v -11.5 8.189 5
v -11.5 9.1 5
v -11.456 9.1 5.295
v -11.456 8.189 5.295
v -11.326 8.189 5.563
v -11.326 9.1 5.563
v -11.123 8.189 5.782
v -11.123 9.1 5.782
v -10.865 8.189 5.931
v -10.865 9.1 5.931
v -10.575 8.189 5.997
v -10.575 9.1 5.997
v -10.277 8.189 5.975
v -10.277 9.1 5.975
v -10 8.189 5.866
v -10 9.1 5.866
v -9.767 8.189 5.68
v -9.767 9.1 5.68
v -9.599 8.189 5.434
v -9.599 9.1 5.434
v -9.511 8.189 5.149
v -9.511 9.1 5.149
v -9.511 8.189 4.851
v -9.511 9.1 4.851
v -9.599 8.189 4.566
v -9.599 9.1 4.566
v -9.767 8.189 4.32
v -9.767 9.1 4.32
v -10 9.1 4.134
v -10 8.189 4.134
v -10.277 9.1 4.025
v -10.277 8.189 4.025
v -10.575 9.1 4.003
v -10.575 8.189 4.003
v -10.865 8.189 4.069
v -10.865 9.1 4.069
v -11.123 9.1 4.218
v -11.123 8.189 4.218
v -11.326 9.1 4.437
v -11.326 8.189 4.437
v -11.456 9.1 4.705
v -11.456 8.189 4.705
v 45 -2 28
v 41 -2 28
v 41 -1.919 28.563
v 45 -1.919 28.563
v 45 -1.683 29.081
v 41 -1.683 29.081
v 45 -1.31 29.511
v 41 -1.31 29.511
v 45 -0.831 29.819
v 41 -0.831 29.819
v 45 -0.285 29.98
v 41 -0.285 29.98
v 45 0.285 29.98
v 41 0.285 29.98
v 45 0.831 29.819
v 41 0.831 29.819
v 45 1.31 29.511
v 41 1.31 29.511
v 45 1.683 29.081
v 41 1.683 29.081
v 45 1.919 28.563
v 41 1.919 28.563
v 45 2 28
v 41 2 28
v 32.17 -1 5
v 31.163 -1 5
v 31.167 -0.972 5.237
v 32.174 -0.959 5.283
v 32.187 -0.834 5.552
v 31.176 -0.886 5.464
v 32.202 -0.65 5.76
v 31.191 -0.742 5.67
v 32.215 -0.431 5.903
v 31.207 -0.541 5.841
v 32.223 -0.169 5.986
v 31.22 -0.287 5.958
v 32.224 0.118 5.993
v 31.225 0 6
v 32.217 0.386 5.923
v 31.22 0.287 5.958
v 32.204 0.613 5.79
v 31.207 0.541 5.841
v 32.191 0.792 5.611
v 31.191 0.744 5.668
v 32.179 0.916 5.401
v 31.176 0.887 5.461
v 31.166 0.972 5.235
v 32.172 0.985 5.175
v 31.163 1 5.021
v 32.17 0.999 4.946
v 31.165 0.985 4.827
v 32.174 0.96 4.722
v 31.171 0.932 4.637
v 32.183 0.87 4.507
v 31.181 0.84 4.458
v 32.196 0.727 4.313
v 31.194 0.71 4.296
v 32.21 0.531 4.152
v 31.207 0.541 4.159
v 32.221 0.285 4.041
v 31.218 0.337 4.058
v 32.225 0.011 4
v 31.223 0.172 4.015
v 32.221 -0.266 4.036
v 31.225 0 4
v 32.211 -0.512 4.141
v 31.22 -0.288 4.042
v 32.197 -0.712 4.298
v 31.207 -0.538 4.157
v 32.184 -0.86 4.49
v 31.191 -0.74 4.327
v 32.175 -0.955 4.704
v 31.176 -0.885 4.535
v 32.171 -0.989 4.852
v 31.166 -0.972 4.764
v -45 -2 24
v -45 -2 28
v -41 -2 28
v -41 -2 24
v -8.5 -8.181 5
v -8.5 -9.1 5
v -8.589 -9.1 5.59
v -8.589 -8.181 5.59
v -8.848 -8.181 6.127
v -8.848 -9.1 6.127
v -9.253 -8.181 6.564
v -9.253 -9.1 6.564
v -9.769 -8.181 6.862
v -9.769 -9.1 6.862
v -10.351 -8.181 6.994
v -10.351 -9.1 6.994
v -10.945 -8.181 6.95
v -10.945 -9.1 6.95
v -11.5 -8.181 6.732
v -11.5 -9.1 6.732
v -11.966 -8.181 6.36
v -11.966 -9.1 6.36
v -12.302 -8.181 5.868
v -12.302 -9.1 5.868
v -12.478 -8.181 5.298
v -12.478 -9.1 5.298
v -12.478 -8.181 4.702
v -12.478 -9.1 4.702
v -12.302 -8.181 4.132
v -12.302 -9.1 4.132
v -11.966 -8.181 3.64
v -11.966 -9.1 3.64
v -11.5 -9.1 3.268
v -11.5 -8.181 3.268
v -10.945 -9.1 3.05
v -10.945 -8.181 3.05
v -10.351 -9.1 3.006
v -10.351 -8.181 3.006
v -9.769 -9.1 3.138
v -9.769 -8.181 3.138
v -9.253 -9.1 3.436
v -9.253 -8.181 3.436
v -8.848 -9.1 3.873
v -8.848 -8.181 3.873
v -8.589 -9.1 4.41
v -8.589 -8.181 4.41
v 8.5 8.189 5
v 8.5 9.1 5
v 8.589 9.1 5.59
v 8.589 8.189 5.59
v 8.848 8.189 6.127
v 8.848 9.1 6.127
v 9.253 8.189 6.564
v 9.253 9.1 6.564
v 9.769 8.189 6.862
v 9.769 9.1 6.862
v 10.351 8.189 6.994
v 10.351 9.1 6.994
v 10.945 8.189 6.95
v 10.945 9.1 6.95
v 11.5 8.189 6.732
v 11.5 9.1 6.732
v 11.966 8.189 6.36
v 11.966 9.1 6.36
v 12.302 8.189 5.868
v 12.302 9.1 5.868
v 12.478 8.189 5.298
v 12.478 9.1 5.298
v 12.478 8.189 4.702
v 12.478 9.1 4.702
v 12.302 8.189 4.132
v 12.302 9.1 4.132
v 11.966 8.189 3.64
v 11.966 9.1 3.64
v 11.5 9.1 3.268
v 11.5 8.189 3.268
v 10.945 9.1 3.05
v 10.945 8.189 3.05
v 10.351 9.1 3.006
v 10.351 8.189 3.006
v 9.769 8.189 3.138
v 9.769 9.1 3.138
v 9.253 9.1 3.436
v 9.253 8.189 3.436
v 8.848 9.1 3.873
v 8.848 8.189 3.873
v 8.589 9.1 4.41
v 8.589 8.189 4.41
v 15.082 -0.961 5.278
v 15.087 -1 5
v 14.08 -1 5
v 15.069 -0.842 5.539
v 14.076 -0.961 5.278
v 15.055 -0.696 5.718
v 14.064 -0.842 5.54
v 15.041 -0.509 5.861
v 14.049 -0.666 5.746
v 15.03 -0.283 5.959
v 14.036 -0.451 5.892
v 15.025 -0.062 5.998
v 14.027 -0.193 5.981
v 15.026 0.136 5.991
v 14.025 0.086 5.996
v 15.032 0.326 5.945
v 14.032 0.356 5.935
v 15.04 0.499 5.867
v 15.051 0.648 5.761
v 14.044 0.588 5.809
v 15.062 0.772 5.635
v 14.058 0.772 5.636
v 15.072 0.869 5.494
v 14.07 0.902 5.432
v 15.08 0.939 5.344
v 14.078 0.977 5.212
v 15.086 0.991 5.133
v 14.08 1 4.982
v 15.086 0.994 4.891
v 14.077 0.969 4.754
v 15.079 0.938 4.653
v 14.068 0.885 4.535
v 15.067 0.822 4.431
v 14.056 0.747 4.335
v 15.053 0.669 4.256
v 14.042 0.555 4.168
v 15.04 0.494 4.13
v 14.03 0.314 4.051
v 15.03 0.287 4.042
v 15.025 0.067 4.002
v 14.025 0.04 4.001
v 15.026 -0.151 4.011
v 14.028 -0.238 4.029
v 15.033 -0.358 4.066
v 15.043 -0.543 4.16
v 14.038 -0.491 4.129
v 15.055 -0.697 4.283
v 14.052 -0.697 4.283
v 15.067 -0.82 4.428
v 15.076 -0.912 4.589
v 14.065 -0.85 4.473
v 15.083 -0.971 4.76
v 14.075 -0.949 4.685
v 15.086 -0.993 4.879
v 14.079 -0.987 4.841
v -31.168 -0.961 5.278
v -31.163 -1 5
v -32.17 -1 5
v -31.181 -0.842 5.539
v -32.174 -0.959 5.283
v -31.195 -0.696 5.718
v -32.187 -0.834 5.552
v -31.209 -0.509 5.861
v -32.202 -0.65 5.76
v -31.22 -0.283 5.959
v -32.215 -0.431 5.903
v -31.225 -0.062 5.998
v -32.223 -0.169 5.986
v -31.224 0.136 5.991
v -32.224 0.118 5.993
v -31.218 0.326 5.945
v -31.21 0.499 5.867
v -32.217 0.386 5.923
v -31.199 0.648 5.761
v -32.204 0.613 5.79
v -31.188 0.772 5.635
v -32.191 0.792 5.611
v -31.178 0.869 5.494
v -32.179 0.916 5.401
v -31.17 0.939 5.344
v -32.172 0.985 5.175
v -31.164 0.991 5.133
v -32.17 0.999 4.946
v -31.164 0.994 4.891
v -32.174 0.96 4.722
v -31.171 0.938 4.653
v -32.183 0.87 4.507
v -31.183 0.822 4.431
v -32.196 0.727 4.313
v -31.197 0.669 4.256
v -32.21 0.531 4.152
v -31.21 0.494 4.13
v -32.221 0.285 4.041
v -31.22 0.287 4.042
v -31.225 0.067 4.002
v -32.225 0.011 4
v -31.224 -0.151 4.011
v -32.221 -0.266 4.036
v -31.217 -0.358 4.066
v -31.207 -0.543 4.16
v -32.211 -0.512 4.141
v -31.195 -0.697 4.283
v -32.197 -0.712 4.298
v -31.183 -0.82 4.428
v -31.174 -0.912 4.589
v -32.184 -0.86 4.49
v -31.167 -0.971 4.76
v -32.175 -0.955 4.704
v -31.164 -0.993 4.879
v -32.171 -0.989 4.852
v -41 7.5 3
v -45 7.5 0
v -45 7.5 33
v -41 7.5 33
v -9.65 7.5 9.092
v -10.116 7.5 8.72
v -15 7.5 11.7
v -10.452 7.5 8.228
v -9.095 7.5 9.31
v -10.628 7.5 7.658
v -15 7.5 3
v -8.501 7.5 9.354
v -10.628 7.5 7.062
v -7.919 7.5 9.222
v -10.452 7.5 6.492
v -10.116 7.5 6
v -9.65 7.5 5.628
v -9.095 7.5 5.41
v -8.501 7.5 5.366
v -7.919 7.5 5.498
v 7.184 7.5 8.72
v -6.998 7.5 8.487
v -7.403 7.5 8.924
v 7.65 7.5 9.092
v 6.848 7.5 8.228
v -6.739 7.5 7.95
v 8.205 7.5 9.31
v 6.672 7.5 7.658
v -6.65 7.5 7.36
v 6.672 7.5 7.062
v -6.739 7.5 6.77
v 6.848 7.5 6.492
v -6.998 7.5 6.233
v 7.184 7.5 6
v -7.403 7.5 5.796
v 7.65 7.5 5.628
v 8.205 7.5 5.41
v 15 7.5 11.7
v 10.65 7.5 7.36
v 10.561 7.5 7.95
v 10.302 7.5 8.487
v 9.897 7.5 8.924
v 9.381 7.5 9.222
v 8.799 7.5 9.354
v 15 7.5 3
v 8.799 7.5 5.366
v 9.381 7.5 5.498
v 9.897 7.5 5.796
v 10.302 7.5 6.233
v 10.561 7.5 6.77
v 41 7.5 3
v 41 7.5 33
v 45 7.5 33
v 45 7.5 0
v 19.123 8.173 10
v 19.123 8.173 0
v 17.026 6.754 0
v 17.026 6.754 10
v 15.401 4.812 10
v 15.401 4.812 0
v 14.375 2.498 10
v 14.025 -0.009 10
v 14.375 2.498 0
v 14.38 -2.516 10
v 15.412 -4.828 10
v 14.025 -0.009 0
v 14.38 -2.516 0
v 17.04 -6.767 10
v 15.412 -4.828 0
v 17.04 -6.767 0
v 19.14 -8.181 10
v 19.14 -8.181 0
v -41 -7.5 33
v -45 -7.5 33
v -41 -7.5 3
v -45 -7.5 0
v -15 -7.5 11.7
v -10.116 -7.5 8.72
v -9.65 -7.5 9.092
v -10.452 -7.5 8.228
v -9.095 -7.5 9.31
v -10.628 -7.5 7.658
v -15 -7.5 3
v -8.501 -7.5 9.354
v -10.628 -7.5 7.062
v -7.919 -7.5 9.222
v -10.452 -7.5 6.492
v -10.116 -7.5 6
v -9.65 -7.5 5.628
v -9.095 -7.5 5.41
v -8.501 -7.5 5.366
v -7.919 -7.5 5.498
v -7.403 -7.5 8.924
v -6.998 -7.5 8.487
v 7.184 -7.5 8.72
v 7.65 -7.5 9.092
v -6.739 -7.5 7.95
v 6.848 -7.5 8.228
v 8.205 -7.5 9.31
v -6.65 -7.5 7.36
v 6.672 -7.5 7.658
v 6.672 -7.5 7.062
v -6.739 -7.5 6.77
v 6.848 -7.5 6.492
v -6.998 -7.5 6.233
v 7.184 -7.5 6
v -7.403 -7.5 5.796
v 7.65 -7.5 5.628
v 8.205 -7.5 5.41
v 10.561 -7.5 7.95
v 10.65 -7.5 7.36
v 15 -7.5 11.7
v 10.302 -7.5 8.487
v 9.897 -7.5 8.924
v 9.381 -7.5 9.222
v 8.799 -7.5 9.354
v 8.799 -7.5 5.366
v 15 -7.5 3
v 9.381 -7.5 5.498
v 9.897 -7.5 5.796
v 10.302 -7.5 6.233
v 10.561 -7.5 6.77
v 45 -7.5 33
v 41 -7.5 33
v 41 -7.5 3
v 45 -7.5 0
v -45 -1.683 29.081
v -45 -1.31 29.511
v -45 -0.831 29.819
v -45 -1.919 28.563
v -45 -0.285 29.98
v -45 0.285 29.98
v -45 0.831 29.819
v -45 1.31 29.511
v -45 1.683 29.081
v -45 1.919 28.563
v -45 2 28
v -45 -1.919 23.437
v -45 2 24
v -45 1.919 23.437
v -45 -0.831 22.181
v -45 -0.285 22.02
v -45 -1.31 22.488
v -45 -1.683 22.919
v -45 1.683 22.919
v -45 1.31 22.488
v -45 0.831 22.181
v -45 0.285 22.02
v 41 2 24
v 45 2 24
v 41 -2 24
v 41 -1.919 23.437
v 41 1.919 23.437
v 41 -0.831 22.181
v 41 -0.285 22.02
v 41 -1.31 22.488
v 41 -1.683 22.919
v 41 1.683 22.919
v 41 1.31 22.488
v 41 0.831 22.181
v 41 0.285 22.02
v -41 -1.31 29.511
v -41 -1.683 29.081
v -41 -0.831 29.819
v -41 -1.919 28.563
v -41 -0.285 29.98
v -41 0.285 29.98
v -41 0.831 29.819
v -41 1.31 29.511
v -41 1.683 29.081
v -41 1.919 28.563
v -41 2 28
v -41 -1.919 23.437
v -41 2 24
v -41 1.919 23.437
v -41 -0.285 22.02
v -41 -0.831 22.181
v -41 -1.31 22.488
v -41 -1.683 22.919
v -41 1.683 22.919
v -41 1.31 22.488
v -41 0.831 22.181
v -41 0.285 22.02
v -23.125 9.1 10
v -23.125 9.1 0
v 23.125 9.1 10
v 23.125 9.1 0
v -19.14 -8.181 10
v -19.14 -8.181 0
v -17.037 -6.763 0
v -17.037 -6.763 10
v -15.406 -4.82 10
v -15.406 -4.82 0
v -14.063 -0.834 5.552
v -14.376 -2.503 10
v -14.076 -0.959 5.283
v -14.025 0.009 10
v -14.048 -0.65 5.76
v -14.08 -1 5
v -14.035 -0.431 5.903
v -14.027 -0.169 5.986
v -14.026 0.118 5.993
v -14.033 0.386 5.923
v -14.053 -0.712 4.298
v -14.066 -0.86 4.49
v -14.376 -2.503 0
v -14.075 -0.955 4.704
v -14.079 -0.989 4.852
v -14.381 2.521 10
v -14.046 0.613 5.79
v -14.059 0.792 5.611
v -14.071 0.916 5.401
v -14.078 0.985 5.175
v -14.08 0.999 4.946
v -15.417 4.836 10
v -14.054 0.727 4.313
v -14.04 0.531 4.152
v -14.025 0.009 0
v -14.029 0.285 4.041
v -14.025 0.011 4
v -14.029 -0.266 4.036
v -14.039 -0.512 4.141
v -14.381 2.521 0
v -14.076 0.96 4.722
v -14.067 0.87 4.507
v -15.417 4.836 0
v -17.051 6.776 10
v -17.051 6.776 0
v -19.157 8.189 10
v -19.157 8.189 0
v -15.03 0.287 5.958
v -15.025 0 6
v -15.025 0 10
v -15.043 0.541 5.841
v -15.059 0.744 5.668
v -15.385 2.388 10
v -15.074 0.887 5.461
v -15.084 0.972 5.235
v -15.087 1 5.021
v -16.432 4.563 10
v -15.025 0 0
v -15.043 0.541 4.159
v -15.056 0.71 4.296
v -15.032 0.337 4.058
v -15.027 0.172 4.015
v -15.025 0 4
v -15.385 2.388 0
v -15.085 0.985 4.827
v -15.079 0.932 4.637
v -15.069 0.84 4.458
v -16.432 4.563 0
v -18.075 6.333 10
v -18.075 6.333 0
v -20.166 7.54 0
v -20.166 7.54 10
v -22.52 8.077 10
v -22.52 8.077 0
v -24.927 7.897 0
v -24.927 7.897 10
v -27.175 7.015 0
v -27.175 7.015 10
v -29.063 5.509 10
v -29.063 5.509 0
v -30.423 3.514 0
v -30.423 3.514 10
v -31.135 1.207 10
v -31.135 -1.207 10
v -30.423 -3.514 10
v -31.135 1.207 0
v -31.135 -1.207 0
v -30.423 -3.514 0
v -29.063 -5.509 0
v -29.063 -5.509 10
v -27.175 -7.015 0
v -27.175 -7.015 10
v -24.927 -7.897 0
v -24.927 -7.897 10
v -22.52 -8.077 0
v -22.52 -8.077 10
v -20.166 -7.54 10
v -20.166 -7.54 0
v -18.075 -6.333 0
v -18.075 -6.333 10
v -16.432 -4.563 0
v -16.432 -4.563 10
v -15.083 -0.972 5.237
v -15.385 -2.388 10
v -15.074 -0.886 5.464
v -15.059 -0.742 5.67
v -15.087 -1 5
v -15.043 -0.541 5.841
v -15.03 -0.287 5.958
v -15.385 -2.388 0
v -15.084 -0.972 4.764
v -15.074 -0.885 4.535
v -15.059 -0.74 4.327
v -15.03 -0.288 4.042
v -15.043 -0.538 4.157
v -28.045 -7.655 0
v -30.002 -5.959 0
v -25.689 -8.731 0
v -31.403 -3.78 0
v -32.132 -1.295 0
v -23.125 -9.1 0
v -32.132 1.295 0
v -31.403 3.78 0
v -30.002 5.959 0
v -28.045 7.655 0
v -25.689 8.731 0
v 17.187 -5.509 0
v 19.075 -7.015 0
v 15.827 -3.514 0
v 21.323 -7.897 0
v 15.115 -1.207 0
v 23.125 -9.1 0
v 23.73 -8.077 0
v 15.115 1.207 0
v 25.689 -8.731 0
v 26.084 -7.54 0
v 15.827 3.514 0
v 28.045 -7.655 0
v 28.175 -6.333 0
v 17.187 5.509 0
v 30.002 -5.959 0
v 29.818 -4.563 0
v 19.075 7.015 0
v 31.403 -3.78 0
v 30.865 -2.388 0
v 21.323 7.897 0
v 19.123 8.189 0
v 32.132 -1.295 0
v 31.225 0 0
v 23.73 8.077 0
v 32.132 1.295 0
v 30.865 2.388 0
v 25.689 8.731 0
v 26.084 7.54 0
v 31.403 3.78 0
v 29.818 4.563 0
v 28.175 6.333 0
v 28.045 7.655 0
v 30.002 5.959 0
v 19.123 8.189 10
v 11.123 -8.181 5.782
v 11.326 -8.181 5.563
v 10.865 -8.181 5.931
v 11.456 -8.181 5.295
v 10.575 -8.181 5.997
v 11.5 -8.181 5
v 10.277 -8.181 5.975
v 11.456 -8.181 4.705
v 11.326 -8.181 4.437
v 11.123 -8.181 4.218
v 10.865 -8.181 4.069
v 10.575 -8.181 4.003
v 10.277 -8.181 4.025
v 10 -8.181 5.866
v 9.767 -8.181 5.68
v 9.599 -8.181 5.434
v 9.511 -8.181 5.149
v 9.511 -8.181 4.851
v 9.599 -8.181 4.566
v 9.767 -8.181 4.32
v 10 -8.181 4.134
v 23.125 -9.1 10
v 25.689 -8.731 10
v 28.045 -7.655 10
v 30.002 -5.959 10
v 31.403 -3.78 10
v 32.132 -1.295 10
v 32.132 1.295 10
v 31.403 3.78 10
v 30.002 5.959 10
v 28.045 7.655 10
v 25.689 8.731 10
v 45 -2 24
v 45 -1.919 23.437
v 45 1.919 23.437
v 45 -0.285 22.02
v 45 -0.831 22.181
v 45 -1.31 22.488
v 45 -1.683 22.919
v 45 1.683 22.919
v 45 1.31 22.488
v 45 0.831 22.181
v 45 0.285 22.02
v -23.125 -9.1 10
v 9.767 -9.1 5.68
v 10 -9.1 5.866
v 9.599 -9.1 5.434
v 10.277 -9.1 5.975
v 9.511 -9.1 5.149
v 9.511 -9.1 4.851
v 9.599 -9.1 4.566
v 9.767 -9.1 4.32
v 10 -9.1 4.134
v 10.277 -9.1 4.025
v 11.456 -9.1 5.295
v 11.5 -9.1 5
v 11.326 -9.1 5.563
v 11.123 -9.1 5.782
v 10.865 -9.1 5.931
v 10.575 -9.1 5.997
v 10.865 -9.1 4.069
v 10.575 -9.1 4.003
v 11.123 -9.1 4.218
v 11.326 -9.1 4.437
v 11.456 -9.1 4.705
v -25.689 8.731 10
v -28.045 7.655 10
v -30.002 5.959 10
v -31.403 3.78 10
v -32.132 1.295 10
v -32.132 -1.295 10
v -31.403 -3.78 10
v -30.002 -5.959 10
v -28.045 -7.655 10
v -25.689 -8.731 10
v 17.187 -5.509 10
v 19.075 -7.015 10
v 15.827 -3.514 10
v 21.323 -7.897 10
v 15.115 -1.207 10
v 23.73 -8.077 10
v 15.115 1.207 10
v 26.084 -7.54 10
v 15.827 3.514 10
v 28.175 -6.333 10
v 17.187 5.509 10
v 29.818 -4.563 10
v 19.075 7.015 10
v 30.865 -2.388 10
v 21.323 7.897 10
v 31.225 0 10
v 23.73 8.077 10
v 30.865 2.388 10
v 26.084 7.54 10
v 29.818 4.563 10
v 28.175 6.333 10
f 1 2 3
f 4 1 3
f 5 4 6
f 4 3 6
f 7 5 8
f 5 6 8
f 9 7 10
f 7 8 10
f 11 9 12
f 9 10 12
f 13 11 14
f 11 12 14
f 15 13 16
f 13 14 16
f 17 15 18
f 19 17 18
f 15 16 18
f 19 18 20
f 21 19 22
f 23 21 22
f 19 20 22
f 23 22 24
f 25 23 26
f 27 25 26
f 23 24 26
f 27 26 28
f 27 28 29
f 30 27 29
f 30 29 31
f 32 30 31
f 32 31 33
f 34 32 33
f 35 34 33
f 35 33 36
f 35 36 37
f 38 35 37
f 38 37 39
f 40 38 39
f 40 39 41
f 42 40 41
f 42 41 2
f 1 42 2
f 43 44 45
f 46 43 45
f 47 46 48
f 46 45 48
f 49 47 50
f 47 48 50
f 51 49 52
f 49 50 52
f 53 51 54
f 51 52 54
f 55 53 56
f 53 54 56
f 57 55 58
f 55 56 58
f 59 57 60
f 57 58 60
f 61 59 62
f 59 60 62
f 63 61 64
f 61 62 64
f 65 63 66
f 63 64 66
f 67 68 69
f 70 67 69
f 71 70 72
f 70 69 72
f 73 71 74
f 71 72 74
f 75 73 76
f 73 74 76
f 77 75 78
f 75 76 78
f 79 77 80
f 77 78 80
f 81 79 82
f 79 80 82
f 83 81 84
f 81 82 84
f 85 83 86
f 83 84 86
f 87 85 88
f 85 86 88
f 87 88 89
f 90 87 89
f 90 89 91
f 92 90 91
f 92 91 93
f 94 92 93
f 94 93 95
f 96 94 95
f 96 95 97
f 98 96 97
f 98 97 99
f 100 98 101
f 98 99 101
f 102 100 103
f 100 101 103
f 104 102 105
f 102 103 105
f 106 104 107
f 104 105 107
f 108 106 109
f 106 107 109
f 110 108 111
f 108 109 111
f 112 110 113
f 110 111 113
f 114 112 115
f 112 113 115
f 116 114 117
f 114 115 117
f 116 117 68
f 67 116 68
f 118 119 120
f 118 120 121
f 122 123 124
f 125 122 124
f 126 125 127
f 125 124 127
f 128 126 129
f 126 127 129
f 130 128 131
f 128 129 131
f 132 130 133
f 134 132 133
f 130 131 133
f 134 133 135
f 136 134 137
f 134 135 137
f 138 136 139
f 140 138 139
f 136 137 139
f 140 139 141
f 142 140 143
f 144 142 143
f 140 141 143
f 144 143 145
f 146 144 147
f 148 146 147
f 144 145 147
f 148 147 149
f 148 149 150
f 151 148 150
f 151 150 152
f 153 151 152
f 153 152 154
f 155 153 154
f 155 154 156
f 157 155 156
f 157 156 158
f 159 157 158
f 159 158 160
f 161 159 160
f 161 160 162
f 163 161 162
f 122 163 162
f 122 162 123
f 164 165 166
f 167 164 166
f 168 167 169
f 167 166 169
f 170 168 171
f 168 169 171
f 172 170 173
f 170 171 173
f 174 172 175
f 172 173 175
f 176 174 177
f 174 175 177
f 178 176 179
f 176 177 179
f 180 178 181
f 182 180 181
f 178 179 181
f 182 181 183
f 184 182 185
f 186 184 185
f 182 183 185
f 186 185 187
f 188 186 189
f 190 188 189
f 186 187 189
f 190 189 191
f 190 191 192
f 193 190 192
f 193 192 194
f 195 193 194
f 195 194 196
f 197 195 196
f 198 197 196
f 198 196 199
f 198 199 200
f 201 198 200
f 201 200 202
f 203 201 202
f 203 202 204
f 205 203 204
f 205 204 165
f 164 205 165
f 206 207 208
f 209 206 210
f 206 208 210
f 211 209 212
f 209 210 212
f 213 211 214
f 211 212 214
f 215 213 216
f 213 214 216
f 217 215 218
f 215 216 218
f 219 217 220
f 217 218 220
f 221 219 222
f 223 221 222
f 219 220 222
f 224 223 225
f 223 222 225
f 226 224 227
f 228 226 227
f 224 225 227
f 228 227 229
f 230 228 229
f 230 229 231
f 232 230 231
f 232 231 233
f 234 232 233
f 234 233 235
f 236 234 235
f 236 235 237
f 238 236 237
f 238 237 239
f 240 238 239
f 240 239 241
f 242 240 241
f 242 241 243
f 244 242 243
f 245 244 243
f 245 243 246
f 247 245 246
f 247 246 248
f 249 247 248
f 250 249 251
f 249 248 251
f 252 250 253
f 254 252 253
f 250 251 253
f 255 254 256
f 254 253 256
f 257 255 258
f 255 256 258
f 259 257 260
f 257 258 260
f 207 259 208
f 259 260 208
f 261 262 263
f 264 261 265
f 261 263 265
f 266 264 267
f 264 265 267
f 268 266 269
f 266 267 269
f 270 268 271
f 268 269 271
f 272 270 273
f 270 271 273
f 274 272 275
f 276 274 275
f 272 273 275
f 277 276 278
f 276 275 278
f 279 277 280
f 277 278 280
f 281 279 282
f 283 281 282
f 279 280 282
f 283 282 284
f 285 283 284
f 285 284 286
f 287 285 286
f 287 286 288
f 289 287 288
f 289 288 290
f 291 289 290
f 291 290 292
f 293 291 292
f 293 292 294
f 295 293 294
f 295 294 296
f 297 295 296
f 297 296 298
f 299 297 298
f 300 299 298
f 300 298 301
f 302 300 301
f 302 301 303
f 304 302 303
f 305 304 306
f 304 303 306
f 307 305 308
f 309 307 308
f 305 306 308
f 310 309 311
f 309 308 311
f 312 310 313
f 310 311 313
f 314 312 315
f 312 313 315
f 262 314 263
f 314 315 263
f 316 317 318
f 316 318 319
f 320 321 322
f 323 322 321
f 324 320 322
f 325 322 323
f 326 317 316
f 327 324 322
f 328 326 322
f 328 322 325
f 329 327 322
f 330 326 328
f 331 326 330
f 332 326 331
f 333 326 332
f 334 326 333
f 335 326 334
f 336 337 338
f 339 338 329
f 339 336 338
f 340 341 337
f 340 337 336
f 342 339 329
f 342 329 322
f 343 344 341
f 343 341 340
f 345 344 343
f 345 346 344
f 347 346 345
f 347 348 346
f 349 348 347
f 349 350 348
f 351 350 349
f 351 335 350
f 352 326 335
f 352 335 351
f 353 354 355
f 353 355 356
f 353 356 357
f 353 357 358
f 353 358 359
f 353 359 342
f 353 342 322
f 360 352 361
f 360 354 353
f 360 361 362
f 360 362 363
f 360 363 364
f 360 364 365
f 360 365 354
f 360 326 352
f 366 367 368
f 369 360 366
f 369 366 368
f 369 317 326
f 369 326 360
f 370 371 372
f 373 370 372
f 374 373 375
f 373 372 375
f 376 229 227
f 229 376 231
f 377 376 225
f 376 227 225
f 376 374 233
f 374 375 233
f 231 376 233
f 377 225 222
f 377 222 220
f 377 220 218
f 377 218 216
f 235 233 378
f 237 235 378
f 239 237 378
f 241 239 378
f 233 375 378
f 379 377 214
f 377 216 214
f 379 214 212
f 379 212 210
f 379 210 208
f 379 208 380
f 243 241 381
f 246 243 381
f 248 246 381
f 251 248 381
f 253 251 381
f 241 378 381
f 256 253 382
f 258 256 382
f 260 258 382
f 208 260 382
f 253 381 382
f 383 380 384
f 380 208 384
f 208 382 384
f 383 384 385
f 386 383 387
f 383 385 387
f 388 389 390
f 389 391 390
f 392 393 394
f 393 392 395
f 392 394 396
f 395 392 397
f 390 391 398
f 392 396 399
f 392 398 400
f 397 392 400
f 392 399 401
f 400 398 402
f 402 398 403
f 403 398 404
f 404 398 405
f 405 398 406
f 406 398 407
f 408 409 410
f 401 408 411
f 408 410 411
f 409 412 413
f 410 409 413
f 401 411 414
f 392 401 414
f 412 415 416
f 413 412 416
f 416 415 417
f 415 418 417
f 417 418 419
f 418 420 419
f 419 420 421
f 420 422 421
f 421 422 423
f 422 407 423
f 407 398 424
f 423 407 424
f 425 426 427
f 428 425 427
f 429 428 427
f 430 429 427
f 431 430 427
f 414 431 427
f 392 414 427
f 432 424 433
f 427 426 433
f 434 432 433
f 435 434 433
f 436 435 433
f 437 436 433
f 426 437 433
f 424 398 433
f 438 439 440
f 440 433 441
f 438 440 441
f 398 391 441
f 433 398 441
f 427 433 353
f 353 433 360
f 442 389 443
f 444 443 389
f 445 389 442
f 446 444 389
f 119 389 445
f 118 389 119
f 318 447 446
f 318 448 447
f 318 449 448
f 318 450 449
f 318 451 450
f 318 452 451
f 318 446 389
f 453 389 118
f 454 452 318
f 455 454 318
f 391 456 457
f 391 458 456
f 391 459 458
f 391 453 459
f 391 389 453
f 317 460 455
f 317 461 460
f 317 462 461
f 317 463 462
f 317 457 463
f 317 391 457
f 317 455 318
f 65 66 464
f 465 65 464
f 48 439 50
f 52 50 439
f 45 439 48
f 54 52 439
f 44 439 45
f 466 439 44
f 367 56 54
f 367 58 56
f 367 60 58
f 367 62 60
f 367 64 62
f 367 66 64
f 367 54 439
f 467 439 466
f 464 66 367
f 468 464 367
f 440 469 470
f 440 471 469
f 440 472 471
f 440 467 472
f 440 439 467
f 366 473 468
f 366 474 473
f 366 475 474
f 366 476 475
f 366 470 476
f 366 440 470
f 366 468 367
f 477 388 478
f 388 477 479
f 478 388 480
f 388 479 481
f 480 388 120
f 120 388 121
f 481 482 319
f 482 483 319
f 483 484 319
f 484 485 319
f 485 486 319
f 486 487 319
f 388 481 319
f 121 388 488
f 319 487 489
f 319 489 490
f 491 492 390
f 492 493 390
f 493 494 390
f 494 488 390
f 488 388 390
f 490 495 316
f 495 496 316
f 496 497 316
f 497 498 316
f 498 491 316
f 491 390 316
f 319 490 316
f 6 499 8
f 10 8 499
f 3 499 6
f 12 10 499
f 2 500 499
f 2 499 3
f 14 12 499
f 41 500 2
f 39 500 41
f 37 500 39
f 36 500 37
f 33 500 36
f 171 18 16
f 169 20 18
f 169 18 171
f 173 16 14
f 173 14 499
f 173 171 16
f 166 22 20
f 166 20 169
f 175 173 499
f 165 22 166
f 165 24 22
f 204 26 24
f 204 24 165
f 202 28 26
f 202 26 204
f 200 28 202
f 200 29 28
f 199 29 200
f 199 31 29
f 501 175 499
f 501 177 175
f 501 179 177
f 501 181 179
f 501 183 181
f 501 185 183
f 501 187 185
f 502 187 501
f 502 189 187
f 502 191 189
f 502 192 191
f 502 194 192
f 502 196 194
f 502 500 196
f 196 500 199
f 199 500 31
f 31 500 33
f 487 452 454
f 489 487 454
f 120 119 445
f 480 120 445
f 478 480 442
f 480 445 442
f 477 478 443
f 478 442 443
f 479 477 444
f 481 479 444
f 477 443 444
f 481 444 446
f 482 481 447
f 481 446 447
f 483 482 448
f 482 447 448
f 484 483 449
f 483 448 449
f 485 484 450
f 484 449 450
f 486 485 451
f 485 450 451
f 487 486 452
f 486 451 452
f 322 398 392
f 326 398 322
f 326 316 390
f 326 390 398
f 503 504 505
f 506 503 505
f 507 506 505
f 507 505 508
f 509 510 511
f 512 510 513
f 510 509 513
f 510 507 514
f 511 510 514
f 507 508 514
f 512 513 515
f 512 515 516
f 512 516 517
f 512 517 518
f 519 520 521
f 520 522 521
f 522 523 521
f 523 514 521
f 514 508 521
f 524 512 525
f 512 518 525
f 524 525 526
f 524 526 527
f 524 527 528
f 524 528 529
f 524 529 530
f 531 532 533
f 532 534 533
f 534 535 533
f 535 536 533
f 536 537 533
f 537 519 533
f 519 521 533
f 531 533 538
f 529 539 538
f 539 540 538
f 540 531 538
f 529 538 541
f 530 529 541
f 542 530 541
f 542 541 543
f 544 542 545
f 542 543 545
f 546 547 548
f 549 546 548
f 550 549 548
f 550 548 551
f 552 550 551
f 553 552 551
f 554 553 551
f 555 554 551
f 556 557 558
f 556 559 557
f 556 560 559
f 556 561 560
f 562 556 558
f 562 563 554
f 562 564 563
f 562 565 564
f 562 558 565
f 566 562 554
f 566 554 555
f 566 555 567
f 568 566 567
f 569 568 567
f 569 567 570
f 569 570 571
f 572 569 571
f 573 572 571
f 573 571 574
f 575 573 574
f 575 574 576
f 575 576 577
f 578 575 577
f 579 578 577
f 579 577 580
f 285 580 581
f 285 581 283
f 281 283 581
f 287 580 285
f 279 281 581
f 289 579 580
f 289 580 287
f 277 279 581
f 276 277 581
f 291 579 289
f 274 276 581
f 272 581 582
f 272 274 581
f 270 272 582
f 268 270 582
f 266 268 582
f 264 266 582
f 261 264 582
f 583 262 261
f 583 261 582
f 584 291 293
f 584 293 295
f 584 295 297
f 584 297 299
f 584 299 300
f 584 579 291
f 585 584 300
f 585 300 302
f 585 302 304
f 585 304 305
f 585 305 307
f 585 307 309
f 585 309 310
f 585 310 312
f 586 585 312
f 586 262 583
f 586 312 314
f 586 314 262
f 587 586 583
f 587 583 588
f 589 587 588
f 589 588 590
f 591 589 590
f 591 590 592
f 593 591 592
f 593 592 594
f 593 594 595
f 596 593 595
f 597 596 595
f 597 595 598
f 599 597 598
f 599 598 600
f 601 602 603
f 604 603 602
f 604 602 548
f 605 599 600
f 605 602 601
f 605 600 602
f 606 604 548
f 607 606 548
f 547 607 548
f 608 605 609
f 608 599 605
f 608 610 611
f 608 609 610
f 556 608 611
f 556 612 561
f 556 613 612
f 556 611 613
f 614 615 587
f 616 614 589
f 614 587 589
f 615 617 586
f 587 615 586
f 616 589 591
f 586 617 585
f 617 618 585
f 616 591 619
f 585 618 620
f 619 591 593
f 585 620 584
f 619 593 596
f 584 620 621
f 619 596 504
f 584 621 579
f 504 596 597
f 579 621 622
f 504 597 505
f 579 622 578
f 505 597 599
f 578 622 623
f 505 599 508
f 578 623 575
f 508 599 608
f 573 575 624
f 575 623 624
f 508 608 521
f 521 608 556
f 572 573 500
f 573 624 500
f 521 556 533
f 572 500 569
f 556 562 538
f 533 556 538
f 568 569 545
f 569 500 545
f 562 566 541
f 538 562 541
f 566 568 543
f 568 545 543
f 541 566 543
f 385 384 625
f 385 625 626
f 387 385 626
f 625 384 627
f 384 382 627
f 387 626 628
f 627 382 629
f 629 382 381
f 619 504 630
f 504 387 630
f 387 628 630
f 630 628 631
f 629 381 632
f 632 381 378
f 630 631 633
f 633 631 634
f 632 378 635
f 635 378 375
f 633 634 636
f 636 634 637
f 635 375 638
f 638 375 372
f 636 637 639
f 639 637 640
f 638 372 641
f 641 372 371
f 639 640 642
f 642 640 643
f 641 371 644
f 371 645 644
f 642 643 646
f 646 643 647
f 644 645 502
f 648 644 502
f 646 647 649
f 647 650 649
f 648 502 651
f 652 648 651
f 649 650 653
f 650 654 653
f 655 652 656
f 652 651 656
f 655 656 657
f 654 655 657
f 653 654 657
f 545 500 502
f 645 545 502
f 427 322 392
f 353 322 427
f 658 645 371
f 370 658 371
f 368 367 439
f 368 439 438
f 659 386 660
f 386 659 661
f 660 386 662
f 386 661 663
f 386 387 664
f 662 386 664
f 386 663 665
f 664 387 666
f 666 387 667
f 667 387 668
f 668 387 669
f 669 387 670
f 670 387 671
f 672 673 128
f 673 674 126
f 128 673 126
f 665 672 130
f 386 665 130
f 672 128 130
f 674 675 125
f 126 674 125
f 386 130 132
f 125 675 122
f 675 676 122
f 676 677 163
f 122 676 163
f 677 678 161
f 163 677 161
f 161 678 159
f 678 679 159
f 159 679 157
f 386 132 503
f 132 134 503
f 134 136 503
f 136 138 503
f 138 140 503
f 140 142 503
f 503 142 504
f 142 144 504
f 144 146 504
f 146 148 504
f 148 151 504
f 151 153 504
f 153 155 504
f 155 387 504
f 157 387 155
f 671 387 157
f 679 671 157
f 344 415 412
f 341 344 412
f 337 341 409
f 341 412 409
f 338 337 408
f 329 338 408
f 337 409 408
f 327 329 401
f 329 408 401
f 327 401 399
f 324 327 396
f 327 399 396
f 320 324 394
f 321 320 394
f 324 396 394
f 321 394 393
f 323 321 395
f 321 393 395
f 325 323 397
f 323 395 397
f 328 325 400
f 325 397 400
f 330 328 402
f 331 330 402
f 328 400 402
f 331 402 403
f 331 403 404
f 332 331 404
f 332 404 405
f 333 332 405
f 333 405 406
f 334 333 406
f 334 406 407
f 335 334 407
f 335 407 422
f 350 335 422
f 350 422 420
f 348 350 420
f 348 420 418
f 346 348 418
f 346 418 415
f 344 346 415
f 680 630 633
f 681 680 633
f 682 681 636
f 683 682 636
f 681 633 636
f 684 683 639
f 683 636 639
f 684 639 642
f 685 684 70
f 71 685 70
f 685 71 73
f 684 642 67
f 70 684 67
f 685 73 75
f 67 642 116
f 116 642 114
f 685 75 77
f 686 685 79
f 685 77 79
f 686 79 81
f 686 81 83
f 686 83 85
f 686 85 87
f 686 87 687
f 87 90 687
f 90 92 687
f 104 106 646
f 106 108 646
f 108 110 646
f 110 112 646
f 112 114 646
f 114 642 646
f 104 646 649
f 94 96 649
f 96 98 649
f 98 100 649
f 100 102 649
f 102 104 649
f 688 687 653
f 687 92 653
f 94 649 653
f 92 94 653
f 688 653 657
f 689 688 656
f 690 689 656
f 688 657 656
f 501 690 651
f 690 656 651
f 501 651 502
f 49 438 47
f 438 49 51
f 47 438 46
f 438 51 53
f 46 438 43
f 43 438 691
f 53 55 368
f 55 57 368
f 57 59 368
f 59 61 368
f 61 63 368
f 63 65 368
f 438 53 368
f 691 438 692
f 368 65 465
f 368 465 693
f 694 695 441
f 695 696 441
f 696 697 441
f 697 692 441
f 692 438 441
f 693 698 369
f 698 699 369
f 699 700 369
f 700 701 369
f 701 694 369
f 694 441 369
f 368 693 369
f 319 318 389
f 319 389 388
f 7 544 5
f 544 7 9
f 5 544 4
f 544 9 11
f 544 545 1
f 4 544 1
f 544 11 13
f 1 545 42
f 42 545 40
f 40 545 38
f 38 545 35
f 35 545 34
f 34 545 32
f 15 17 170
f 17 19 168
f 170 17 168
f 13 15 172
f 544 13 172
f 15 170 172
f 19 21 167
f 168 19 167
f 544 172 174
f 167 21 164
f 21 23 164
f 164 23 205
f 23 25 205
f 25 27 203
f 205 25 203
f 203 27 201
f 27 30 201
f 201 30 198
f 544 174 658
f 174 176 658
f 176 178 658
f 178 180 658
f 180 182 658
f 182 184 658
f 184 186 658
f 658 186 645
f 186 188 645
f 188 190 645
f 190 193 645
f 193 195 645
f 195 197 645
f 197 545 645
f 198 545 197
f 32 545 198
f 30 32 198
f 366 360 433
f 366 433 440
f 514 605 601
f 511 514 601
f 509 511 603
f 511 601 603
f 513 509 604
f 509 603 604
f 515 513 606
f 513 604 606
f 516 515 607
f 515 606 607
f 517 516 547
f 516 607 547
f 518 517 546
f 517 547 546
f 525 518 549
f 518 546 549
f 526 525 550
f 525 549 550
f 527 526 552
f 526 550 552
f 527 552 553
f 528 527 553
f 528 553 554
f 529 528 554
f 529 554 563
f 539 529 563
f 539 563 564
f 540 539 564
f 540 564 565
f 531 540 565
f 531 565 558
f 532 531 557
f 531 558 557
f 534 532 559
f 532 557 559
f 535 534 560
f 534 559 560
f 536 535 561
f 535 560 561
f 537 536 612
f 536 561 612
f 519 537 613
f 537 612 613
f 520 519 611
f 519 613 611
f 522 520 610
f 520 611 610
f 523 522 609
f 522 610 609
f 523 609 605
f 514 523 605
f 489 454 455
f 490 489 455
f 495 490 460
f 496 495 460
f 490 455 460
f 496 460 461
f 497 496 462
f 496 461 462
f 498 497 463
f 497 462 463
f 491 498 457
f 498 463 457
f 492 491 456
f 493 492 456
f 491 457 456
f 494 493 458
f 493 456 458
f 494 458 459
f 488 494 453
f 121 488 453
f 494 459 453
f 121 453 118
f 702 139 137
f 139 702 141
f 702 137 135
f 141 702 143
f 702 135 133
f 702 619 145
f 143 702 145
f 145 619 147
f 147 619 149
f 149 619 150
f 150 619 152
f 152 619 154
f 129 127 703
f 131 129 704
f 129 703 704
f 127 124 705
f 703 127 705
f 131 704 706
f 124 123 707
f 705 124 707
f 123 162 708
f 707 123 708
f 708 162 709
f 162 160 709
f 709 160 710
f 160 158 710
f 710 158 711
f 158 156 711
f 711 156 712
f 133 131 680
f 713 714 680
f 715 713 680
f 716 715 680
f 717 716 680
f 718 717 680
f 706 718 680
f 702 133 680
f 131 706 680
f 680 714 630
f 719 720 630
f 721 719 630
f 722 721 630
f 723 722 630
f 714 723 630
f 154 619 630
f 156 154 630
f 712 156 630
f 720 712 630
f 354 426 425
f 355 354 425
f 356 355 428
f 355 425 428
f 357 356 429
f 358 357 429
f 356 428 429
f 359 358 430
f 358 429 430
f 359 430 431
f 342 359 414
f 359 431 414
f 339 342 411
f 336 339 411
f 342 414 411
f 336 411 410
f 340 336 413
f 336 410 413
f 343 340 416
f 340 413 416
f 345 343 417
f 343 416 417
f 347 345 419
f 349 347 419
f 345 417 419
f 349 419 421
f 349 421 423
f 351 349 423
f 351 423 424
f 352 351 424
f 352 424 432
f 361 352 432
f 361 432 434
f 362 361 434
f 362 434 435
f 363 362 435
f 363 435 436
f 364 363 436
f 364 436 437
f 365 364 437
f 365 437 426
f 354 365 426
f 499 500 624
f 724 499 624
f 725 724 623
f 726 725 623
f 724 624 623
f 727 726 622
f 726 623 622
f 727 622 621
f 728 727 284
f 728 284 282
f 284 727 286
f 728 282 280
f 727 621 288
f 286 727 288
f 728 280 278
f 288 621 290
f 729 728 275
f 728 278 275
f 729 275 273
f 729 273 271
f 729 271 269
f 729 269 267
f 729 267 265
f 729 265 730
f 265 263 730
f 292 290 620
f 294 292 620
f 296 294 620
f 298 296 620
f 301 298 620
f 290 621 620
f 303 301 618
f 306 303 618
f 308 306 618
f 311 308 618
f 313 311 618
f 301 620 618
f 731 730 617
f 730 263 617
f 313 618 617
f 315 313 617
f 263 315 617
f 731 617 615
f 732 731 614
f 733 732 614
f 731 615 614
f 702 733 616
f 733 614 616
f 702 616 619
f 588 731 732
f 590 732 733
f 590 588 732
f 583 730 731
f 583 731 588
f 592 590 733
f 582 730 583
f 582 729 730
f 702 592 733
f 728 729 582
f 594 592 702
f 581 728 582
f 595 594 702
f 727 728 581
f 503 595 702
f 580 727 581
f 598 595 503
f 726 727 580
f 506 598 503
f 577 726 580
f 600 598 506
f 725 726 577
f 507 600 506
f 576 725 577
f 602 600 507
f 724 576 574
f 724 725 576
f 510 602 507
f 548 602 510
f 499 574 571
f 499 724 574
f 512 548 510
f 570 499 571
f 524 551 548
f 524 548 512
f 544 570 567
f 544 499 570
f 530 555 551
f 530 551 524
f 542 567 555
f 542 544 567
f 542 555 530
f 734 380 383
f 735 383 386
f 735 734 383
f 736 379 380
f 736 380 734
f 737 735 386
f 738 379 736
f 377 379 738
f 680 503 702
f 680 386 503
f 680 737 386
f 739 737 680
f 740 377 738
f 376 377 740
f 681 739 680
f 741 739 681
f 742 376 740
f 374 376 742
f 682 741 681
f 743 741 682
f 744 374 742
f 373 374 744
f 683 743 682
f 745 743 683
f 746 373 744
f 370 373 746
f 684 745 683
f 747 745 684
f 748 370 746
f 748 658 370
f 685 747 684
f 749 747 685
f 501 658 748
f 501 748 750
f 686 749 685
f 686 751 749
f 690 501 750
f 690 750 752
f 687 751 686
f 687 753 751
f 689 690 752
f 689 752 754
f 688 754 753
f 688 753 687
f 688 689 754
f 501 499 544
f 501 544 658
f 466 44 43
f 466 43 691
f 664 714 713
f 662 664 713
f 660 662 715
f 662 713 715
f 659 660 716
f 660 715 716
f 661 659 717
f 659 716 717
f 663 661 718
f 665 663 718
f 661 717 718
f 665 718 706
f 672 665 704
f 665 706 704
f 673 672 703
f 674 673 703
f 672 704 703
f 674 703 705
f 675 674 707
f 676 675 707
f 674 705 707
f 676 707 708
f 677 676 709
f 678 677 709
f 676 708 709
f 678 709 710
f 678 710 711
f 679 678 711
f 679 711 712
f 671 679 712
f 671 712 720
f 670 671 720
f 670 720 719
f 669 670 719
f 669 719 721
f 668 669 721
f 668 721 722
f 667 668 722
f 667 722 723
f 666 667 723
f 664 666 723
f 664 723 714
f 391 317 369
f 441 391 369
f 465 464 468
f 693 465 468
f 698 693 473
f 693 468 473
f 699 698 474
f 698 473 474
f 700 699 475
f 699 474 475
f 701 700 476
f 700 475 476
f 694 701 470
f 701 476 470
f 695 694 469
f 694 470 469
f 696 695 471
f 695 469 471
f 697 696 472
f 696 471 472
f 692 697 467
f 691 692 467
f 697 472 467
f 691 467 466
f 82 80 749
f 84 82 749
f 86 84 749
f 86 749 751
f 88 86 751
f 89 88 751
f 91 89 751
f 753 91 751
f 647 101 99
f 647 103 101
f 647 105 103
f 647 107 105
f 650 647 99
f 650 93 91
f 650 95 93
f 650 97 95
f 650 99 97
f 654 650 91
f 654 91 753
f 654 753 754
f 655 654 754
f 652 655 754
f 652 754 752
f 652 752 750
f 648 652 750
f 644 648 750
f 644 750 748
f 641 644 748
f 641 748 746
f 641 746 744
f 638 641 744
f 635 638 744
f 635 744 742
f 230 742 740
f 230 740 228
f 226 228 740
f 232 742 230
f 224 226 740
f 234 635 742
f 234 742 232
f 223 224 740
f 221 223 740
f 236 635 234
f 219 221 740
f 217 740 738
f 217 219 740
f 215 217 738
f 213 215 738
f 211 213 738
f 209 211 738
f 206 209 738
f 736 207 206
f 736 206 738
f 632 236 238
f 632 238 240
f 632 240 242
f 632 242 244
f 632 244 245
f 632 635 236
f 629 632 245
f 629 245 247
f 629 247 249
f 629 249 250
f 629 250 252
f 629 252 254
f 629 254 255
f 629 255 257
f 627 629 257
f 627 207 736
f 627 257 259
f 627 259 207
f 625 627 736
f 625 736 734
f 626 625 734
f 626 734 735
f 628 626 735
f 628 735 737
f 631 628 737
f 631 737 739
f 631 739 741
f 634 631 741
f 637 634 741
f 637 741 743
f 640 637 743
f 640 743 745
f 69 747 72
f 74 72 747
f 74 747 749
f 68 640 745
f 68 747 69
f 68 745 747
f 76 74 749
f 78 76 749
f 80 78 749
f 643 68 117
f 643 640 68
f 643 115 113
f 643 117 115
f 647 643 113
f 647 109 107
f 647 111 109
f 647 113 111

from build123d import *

# Parameters (mm, degrees)
SKETCH_W        = 90
SKETCH_H        = 15
PAD_DEPTH       = 3
SKETCH001_W     = 30
SKETCH001_H     = 15
PAD001_DEPTH    = 8.7
SKETCH002_R     = 2
POCKET_DEPTH    = 15.001
SKETCH003_W     = 4
SKETCH003_H     = 15
PAD002_DEPTH    = 30
POCKET001_DEPTH = 90.001
SKETCH005_R     = 8.1
PAD003_DEPTH    = 10
SKETCH006_W     = 64.8
SKETCH006_H     = 18.2
PAD004_DEPTH    = 10
SKETCH007_R     = 1
POCKET002_DEPTH = 64.801
SKETCH008_W     = 64.8
SKETCH008_H     = 18.2
POCKET003_DEPTH = 10
SKETCH009_R     = 2
SKETCH009_R_2   = 1
POCKET004_DEPTH = 2
SKETCH010_R     = 2
SKETCH010_R_2   = 1
POCKET005_DEPTH = 2


with BuildPart() as motorbracketbody:
    # Sketch → Pad (new body)
    with BuildSketch(Plane.XY):
        Rectangle(SKETCH_W, SKETCH_H)
    extrude(amount=PAD_DEPTH)

    # Sketch001 (on Face6 of Pad) → Pad001 (join)
    with BuildSketch(Plane.XY.offset(3)):
        Rectangle(SKETCH001_W, SKETCH001_H)
    extrude(amount=PAD001_DEPTH)

    # Sketch002 (on Face12 of Pad001) → Pocket (cut, through all)
    with BuildSketch(Plane.XZ.offset(7.5)):
        with Locations((8.65, 7.36)):
            Circle(SKETCH002_R)
        with Locations((-8.65, 7.36)):
            Circle(SKETCH002_R)
    extrude(amount=-POCKET_DEPTH, mode=Mode.SUBTRACT)

    # Sketch003 (on Face5 of Pocket) → Pad002 (join)
    with BuildSketch(Plane.XY.offset(3)):
        with Locations((-43, 0)):
            Rectangle(SKETCH003_W, SKETCH003_H)
        with Locations((43, 0)):
            Rectangle(SKETCH003_W, SKETCH003_H)
    extrude(amount=PAD002_DEPTH)

    # Sketch004 (on Face11 of Pad002) → Pocket001 (cut, through all)
    with BuildSketch(Plane(origin=(-45, 0, 0), x_dir=(0, -1, 0), z_dir=(-1, 0, 0))):
        with BuildLine():
            ThreePointArc((2, 27.999998), (0, 30), (-2, 27.999998))
            Line((-2, 27.999998), (-2, 23.999985))
            ThreePointArc((-2, 23.999985), (0, 22), (2, 23.999985))
            Line((2, 27.999998), (2, 23.999985))
        make_face()
    extrude(amount=-POCKET001_DEPTH, mode=Mode.SUBTRACT)


with BuildPart() as motorringsbody:
    # Sketch005 → Pad003 (new body)
    with BuildSketch(Plane.XY):
        with BuildLine():
            ThreePointArc((-23.125, 9.1), (-32.225, 0), (-23.125, -9.1))
            Line((23.125, -9.1), (-23.125, -9.1))
            ThreePointArc((23.125, -9.1), (32.225, 0), (23.125, 9.1))
            Line((-23.125, 9.1), (23.125, 9.1))
        make_face()
        with Locations((-23.125, 0)):
            Circle(SKETCH005_R, mode=Mode.SUBTRACT)
        with Locations((23.125, 0)):
            Circle(SKETCH005_R, mode=Mode.SUBTRACT)
        with BuildLine():
            ThreePointArc((-19.14, -8.181062), (-14.025005, 0.00945), (-19.157, 8.189321))
            Line((-19.157, 8.189321), (19.123, 8.189321))
            Line((19.123, 8.189321), (19.123, 8.172759))
            ThreePointArc((19.123, 8.172759), (14.025005, -0.00946), (19.14, -8.181062))
            Line((19.14, -8.181062), (-19.14, -8.181062))
        make_face(mode=Mode.SUBTRACT)
    extrude(amount=PAD003_DEPTH)

    # Sketch006 (on Face13 of Pad003) → Pad004 (join)
    with BuildSketch(Plane.XY.offset(10)):
        Rectangle(SKETCH006_W, SKETCH006_H)
    extrude(amount=PAD004_DEPTH)

    # Sketch007 (on Face2 of Pad004) → Pocket002 (cut, through all)
    with BuildSketch(Plane(origin=(-32.4, 0, 0), x_dir=(0, -1, 0), z_dir=(-1, 0, 0))):
        with Locations((0, 5)):
            Circle(SKETCH007_R)
    extrude(amount=-POCKET002_DEPTH, mode=Mode.SUBTRACT)

    # Sketch008 (on Face7 of Pocket002) → Pocket003 (cut)
    with BuildSketch(Plane.XY.offset(20)):
        Rectangle(SKETCH008_W, SKETCH008_H)
    extrude(amount=-POCKET003_DEPTH, mode=Mode.SUBTRACT)

    # Sketch009 (on Face6 of Pocket003) → Pocket004 (cut)
    with BuildSketch(Plane.XZ.offset(9.1)):
        with Locations((-10.5, 5)):
            Circle(SKETCH009_R)
        with Locations((10.5, 5)):
            Circle(SKETCH009_R_2)
    extrude(amount=-POCKET004_DEPTH, mode=Mode.SUBTRACT)

    # Sketch010 (on Face1 of Pocket004) → Pocket005 (cut)
    with BuildSketch(Plane(origin=(0, 9.1, 0), x_dir=(-1, 0, 0), z_dir=(0, 1, 0))):
        with Locations((-10.5, 5)):
            Circle(SKETCH010_R)
        with Locations((10.5, 5)):
            Circle(SKETCH010_R_2)
    extrude(amount=-POCKET005_DEPTH, mode=Mode.SUBTRACT)


solid = Compound([motorbracketbody.part, motorringsbody.part])
